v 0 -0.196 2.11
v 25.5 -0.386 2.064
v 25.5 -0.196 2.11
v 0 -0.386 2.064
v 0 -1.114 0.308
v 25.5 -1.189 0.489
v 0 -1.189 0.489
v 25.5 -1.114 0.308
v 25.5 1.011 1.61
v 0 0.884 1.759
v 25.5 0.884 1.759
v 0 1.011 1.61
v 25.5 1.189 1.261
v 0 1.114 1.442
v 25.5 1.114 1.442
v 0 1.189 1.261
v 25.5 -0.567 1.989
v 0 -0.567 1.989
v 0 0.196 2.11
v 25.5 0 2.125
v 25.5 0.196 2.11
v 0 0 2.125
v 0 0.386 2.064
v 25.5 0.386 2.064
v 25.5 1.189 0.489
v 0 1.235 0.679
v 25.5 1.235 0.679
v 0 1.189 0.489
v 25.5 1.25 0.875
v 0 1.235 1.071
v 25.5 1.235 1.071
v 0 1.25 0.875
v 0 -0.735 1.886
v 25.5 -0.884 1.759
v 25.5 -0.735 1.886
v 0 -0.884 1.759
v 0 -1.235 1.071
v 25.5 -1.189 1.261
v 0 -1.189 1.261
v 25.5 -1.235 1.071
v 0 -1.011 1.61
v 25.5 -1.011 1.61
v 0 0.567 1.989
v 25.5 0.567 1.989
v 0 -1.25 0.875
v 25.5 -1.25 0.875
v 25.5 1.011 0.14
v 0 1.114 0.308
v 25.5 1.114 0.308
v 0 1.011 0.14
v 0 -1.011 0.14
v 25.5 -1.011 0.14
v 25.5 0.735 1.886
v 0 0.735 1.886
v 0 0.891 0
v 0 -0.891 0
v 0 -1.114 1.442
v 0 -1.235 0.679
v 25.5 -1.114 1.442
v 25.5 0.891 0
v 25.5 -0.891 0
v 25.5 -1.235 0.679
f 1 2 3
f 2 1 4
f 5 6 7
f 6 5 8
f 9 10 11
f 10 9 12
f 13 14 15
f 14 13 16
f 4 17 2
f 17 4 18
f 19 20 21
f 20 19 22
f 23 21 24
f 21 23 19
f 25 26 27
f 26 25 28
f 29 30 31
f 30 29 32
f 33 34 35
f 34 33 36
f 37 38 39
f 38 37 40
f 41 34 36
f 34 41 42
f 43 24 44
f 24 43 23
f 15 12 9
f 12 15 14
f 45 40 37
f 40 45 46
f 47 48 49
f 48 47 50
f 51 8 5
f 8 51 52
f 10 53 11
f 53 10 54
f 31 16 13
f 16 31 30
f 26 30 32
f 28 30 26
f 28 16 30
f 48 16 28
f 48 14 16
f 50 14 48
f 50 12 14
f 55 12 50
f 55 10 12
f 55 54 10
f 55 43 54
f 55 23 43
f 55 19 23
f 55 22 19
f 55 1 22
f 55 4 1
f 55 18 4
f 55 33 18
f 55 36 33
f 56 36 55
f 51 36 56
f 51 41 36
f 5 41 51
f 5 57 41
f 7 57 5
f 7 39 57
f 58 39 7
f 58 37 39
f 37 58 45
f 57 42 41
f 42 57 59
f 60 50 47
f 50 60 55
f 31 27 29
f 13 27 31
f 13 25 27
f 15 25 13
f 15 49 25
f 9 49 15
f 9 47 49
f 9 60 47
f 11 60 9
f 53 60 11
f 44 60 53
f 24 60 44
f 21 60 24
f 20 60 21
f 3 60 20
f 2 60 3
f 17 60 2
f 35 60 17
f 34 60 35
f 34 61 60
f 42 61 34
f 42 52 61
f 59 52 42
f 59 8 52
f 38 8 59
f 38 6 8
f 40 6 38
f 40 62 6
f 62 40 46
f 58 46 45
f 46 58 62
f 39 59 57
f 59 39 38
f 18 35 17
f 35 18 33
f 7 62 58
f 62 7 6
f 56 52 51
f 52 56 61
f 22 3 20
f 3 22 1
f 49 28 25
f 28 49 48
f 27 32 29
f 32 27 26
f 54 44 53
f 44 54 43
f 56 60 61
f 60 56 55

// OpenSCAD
include <../lib/filament-spool-roller-lib.scad>;
$fn = 40;
lock_pin();
